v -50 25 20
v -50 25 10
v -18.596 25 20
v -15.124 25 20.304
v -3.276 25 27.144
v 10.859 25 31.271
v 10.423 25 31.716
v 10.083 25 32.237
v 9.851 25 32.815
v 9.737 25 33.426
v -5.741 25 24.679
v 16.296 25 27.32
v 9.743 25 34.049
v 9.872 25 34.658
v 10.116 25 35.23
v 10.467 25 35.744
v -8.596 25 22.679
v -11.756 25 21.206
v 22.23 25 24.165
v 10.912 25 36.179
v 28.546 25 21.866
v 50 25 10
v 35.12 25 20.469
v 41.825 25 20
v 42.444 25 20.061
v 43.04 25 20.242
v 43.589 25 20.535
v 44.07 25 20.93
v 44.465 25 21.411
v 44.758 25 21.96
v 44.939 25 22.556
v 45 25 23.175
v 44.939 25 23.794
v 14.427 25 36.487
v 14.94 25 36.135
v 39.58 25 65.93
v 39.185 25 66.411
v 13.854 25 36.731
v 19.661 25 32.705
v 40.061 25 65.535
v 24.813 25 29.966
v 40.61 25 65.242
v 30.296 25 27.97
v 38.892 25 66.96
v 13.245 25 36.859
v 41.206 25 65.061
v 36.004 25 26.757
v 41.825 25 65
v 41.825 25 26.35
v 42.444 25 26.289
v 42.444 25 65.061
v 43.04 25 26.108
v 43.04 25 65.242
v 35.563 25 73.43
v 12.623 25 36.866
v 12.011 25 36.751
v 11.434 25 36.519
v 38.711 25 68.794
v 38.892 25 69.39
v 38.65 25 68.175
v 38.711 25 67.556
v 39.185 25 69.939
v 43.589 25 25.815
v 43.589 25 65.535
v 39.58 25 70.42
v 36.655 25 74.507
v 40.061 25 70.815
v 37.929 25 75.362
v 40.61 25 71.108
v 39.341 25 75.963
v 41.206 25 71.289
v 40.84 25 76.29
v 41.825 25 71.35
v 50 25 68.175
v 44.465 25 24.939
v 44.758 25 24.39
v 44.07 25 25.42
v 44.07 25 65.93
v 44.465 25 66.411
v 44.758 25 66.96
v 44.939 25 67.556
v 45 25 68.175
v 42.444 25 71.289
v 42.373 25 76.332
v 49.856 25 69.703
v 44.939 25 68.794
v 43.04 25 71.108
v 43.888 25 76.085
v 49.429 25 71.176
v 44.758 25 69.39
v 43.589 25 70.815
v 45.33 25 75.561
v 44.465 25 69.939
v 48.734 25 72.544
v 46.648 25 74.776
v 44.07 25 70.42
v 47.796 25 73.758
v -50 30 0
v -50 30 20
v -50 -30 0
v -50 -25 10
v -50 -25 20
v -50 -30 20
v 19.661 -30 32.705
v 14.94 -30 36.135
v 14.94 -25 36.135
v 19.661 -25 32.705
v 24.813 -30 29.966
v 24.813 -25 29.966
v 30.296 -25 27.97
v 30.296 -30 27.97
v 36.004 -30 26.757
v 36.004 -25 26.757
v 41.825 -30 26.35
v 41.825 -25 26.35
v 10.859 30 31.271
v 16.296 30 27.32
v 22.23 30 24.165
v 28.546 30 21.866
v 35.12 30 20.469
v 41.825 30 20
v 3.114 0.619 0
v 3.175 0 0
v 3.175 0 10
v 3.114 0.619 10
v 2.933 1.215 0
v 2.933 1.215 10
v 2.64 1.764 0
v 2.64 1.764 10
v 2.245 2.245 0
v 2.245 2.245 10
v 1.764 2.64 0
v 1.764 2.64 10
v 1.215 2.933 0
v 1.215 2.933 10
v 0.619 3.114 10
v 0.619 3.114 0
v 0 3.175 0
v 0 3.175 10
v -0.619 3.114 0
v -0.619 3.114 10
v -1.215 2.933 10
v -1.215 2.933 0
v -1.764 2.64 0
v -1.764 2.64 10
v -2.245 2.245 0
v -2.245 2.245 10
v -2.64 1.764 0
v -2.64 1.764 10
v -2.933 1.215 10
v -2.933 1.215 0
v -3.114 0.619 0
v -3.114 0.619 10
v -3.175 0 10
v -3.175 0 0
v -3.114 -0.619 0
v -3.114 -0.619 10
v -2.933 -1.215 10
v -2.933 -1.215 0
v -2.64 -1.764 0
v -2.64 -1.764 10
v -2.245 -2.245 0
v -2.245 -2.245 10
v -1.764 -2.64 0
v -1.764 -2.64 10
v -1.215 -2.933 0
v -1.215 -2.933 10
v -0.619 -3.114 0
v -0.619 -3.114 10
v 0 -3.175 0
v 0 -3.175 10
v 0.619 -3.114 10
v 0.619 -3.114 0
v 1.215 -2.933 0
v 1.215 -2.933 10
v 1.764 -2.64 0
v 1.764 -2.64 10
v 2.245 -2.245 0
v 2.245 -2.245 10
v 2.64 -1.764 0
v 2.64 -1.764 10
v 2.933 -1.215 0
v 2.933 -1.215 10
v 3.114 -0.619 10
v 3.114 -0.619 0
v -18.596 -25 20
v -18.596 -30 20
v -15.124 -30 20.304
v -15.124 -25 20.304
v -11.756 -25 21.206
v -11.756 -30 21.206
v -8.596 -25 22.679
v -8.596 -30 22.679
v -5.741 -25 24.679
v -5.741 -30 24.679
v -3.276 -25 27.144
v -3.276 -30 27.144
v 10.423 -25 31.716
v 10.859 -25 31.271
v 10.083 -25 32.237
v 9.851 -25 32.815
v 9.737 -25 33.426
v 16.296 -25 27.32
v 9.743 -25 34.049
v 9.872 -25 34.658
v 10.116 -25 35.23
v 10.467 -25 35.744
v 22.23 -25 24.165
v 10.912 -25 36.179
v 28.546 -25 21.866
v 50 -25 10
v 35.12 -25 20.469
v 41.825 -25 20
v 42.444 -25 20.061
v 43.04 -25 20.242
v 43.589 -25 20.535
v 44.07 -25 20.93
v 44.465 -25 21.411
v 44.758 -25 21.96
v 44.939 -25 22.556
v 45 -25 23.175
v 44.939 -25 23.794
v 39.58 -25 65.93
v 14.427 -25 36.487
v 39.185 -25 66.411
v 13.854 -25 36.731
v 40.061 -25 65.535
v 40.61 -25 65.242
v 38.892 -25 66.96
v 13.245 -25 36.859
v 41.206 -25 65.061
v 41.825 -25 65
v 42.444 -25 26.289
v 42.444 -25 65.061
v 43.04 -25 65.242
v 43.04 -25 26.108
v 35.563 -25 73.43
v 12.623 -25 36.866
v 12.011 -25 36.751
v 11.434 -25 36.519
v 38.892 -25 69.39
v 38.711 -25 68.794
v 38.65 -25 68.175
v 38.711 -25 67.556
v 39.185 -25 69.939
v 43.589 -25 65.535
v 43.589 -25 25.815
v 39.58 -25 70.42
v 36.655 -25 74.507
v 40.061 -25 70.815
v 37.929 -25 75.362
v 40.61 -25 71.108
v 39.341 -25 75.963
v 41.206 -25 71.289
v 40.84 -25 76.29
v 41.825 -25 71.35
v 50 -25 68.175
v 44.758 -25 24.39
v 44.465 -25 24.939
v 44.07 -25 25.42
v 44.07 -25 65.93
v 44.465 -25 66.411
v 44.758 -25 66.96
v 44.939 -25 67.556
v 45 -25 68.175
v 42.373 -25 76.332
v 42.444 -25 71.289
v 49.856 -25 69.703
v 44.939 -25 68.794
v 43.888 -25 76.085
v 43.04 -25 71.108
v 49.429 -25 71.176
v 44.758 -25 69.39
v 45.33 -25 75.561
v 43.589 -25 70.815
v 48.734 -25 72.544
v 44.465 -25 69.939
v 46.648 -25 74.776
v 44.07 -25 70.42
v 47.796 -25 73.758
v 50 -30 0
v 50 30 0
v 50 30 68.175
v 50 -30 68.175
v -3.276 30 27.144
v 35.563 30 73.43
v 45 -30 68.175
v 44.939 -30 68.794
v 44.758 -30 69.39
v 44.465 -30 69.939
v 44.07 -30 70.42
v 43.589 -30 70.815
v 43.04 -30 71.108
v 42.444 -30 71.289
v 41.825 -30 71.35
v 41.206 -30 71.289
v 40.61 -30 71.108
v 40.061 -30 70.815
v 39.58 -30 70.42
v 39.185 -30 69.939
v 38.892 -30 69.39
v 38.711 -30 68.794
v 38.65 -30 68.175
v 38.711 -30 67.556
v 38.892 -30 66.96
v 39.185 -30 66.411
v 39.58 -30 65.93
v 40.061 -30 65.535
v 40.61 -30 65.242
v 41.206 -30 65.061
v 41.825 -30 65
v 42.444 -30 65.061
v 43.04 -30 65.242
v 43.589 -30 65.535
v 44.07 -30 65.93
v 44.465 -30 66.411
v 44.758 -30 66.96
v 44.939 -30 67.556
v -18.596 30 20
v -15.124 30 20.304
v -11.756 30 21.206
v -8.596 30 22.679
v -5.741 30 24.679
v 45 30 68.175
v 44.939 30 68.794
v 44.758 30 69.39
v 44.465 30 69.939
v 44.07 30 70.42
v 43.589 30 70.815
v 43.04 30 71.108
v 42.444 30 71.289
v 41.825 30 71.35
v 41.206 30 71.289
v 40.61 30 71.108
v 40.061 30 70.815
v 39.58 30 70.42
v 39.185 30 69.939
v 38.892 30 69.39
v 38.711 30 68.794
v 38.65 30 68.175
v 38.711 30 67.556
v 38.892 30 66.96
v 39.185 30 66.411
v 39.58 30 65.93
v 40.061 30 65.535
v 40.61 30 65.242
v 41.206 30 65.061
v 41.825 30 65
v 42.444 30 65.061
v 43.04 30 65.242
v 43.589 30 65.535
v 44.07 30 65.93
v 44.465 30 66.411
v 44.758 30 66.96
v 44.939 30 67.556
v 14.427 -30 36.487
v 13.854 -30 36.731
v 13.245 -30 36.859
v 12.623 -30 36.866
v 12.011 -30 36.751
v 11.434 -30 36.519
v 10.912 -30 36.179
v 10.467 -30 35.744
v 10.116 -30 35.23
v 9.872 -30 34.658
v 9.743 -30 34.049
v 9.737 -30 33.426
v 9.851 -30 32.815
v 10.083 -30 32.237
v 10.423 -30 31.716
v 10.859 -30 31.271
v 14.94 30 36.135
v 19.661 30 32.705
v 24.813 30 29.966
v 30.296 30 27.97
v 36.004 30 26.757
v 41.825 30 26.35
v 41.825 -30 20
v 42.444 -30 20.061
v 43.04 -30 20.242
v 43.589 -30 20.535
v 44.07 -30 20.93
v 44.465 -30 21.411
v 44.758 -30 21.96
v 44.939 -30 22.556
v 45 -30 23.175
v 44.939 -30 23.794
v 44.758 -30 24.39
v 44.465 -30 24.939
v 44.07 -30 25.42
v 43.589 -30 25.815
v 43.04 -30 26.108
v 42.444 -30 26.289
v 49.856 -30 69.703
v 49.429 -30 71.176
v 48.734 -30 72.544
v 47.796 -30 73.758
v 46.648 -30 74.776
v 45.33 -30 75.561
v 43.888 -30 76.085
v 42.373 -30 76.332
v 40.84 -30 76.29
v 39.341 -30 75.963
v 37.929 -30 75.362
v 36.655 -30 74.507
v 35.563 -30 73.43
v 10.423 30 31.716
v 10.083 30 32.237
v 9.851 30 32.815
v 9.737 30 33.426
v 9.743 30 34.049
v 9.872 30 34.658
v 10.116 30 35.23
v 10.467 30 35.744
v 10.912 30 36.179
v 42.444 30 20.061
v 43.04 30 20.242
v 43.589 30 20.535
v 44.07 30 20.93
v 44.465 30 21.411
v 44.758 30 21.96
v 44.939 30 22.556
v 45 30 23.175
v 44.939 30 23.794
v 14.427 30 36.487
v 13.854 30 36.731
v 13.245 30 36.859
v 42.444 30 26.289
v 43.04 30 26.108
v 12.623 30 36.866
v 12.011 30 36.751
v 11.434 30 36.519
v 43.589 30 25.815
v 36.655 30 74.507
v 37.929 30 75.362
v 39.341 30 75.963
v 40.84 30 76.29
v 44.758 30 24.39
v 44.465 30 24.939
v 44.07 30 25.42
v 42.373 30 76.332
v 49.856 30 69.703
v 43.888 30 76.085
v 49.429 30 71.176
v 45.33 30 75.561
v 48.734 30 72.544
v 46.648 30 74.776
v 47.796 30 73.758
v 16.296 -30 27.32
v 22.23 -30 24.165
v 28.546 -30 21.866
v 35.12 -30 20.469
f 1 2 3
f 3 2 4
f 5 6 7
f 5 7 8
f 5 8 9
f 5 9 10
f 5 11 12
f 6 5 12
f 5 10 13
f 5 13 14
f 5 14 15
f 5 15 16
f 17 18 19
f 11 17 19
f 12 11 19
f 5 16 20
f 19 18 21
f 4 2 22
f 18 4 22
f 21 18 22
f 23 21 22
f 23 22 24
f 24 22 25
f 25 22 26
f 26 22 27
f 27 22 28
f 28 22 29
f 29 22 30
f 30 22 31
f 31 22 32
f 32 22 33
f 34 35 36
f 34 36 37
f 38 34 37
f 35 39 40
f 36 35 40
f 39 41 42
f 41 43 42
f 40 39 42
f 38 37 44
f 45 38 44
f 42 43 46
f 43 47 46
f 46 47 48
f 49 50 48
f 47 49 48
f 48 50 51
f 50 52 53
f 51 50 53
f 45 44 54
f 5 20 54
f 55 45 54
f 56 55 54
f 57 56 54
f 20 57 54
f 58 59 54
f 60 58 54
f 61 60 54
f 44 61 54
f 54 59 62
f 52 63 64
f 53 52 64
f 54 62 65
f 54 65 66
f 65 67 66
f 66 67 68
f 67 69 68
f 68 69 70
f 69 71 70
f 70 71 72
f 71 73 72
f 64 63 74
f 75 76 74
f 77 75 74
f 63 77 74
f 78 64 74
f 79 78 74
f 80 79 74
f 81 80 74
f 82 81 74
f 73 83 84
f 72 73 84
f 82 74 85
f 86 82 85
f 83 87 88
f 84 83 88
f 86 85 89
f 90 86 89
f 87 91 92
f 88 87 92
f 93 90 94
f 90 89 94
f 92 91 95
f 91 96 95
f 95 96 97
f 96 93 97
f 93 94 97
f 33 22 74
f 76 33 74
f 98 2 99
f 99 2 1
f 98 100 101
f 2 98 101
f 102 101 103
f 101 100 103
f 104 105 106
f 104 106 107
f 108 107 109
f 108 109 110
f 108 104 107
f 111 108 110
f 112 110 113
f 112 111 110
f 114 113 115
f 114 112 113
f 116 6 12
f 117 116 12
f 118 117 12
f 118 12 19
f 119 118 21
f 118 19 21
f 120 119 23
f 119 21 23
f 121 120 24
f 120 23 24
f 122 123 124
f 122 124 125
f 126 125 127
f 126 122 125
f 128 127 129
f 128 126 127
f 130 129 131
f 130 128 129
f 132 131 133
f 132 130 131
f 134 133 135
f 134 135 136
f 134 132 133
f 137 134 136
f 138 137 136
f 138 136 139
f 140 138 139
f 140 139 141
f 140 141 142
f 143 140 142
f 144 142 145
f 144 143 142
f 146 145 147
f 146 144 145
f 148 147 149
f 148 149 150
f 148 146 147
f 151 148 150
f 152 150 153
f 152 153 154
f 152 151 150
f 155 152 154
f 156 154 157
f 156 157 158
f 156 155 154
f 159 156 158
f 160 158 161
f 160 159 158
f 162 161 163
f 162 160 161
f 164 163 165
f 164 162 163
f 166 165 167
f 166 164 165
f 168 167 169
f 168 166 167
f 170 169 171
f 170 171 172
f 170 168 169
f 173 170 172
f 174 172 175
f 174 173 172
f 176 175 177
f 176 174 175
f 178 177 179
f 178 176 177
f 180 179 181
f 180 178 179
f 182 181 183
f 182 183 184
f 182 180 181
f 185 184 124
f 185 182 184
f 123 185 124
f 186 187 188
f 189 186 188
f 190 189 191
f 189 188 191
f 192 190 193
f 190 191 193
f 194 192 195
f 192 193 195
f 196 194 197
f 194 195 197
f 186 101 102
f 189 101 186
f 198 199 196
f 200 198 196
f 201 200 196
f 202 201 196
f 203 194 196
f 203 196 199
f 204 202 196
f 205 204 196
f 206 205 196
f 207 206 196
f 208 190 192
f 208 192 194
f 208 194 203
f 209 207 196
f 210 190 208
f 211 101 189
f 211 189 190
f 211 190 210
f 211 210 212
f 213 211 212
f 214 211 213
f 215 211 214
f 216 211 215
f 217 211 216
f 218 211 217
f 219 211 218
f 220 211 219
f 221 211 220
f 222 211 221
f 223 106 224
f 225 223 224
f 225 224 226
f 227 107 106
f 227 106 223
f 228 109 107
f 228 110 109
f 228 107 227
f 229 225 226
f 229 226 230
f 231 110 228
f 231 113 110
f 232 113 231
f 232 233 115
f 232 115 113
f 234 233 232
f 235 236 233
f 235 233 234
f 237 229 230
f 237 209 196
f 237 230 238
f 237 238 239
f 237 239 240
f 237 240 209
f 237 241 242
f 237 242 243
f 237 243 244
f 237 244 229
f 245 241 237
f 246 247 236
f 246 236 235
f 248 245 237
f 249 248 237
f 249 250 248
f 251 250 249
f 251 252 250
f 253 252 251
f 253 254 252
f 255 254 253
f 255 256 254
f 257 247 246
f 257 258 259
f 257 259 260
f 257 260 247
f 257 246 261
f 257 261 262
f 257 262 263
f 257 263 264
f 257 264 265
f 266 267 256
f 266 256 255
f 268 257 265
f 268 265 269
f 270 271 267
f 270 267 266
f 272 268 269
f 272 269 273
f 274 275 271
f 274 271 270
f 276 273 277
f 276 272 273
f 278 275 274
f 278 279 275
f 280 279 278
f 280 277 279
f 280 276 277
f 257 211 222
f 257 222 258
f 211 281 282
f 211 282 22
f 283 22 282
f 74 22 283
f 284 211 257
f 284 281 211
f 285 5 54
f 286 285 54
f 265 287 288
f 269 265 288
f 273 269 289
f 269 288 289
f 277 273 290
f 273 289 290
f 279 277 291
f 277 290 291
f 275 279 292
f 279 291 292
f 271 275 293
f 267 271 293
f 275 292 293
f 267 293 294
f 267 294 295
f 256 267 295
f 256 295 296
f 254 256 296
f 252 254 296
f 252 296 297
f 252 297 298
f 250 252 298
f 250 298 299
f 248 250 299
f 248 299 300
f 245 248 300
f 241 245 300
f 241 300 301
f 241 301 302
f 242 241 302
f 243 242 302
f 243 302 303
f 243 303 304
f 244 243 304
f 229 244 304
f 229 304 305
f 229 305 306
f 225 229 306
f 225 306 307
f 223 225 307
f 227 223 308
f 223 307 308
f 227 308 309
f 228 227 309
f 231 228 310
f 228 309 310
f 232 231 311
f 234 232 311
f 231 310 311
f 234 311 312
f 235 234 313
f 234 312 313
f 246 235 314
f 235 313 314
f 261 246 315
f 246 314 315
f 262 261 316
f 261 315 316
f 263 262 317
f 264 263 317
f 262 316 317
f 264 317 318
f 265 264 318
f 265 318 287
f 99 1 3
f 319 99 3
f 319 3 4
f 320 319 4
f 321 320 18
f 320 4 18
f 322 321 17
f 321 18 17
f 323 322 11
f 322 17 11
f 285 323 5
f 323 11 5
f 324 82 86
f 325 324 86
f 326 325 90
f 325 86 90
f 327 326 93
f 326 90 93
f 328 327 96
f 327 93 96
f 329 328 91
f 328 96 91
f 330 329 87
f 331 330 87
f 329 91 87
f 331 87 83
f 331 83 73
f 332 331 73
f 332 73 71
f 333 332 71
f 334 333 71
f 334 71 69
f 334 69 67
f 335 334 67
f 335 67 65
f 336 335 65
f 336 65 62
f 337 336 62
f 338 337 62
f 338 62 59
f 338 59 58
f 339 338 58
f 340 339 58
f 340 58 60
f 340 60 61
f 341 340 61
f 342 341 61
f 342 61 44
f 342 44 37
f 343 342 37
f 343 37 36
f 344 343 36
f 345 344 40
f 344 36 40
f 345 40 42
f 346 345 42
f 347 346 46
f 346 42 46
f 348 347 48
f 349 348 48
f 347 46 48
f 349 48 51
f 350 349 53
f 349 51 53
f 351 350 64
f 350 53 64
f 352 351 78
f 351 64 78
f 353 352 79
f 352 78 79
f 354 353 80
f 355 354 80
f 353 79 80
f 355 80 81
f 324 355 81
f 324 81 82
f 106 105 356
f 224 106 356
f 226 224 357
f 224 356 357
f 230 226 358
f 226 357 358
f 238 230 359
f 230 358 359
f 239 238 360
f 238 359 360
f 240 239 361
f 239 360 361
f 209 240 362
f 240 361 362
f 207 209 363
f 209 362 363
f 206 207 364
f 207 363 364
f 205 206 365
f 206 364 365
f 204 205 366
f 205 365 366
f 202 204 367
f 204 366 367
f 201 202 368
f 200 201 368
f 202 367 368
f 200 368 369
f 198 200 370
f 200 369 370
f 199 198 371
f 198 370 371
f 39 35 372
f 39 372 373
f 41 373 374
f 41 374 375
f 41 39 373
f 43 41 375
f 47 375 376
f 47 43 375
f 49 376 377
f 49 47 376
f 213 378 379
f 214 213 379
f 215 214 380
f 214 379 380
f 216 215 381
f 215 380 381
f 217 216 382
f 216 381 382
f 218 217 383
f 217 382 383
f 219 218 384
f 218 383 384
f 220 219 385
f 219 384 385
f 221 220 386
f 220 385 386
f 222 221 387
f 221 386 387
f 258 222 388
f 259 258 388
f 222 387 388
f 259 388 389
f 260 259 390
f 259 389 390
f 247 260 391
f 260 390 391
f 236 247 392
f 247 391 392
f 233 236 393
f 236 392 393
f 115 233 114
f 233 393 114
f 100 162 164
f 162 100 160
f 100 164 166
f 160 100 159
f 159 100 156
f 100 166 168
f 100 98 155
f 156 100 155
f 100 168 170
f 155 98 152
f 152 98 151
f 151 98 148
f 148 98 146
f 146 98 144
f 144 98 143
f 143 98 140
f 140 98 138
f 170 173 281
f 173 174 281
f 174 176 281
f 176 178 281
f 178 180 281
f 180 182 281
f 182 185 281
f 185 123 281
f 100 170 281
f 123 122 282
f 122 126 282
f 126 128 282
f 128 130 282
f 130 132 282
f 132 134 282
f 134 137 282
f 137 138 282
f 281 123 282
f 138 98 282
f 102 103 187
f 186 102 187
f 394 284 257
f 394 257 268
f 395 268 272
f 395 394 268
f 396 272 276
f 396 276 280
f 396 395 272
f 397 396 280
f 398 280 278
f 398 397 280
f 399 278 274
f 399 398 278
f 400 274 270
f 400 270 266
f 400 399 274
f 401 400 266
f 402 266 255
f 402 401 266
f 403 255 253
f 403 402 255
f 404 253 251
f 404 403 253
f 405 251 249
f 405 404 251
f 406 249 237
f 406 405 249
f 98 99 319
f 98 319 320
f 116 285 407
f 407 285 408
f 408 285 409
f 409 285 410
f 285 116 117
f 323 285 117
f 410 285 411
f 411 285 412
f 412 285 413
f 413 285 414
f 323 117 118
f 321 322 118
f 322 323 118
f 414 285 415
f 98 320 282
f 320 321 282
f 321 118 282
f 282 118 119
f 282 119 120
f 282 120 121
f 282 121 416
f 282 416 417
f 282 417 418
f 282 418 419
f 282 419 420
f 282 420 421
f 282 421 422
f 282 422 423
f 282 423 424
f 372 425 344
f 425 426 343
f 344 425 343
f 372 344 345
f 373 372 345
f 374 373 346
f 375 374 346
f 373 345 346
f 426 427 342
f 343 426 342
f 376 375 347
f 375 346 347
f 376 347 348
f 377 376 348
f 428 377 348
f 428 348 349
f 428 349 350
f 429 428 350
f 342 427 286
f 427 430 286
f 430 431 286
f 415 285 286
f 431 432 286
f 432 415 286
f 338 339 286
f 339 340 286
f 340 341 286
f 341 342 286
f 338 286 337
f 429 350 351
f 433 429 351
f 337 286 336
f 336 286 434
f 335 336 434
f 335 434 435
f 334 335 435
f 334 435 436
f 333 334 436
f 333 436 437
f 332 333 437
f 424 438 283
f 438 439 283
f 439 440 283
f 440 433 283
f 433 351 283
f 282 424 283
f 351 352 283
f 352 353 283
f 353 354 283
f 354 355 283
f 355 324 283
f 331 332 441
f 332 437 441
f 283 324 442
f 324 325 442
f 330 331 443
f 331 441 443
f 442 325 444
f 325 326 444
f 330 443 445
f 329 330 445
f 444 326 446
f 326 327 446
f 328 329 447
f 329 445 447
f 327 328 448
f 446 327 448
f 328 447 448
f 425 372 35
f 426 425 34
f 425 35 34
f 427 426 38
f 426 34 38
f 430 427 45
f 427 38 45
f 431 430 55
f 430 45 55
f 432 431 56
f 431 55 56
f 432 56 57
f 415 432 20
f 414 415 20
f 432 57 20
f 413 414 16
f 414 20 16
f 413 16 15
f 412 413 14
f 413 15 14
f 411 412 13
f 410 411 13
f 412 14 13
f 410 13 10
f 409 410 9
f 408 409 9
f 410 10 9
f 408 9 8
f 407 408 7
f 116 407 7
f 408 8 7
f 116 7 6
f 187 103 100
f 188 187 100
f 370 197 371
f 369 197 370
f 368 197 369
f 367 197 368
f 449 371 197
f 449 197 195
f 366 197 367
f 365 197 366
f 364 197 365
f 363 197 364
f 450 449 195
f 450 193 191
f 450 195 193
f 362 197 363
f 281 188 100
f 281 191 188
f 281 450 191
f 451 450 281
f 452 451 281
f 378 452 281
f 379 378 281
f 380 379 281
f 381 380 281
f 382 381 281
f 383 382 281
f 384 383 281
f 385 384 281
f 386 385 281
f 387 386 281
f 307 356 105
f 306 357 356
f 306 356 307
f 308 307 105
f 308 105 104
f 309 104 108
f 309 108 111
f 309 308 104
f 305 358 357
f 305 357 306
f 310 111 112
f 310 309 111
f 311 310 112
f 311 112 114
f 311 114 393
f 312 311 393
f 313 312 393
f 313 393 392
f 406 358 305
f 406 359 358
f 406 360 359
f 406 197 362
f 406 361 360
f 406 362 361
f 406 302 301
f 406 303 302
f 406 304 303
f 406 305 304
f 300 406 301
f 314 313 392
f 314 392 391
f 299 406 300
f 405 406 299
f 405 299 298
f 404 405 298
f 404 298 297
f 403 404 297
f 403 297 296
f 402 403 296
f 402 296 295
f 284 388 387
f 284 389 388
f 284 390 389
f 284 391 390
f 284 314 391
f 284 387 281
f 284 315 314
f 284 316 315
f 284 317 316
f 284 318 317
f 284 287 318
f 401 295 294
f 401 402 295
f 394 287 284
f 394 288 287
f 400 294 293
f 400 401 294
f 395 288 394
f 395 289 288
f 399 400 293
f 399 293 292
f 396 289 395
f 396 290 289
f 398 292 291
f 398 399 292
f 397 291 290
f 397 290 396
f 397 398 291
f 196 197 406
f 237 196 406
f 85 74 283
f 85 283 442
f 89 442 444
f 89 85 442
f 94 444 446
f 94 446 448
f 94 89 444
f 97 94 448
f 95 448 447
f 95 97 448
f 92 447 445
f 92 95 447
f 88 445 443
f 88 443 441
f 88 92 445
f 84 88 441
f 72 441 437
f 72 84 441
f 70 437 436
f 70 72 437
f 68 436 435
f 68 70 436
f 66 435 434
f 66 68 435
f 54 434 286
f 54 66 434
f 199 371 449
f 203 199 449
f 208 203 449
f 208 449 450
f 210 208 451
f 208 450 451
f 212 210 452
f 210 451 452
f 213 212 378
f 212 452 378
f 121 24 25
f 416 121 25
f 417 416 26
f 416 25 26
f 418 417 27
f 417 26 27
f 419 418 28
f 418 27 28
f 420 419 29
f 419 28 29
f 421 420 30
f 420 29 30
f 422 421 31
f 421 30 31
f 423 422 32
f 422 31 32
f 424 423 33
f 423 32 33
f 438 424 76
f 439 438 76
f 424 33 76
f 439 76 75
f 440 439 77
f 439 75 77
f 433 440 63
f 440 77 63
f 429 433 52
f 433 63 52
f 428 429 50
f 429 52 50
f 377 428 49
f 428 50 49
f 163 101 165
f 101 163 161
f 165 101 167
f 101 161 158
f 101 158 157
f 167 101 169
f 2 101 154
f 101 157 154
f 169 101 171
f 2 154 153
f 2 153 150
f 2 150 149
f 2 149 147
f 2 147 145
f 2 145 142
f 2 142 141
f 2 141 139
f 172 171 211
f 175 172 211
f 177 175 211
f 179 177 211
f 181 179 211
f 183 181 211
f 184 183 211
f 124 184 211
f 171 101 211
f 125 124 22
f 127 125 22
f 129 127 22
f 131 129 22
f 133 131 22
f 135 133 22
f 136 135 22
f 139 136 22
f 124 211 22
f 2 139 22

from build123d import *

# Parameters (mm, degrees)
SKETCH002_W  = 100
SKETCH002_H  = 60
SKETCH002_R  = 3.175
PAD002_DEPTH = 10
SKETCH003_R  = 3.175
PAD003_DEPTH = 60
SKETCH004_W  = 50
SKETCH004_H  = 66.35
POCKET_DEPTH = 100.001


with BuildPart() as part:
    # Sketch002 → Pad002 (new body)
    with BuildSketch(Plane.XY):
        Rectangle(SKETCH002_W, SKETCH002_H)
        Circle(SKETCH002_R, mode=Mode.SUBTRACT)
    extrude(amount=PAD002_DEPTH)

    # Sketch003 (on Face1 of Pad002) → Pad003 (join)
    with BuildSketch(Plane.XZ.offset(30)):
        with BuildLine():
            ThreePointArc((50, 68.175), (44.621015, 75.856987), (35.562587, 73.429789))
            Line((-3.275594, 27.144248), (35.562587, 73.429789))
            ThreePointArc((-18.596482, 20), (-10.144117, 21.873844), (-3.275594, 27.144248))
            Line((-50, 20), (-18.596482, 20))
            Line((-50, 10), (-50, 20))
            Line((-50, 10), (50, 10))
            Line((50, 10), (50, 68.175))
        make_face()
        with Locations((41.825, 68.175)):
            Circle(SKETCH003_R, mode=Mode.SUBTRACT)
        with BuildLine():
            ThreePointArc((10.858707, 31.270809), (25.34818, 22.905308), (41.825, 20))
            ThreePointArc((41.825, 20), (45, 23.175), (41.825, 26.35))
            ThreePointArc((14.940408, 36.135191), (27.520008, 28.872356), (41.825, 26.35))
            ThreePointArc((14.940408, 36.135191), (10.467366, 35.743851), (10.858707, 31.270809))
        make_face(mode=Mode.SUBTRACT)
    extrude(amount=-PAD003_DEPTH)

    # Sketch004 (on Face15 of Pad003) → Pocket (cut, through all)
    with BuildSketch(Plane.YZ.offset(50)):
        with Locations((0, 43.175)):
            Rectangle(SKETCH004_W, SKETCH004_H)
    extrude(amount=-POCKET_DEPTH, mode=Mode.SUBTRACT)


solid = part.part
